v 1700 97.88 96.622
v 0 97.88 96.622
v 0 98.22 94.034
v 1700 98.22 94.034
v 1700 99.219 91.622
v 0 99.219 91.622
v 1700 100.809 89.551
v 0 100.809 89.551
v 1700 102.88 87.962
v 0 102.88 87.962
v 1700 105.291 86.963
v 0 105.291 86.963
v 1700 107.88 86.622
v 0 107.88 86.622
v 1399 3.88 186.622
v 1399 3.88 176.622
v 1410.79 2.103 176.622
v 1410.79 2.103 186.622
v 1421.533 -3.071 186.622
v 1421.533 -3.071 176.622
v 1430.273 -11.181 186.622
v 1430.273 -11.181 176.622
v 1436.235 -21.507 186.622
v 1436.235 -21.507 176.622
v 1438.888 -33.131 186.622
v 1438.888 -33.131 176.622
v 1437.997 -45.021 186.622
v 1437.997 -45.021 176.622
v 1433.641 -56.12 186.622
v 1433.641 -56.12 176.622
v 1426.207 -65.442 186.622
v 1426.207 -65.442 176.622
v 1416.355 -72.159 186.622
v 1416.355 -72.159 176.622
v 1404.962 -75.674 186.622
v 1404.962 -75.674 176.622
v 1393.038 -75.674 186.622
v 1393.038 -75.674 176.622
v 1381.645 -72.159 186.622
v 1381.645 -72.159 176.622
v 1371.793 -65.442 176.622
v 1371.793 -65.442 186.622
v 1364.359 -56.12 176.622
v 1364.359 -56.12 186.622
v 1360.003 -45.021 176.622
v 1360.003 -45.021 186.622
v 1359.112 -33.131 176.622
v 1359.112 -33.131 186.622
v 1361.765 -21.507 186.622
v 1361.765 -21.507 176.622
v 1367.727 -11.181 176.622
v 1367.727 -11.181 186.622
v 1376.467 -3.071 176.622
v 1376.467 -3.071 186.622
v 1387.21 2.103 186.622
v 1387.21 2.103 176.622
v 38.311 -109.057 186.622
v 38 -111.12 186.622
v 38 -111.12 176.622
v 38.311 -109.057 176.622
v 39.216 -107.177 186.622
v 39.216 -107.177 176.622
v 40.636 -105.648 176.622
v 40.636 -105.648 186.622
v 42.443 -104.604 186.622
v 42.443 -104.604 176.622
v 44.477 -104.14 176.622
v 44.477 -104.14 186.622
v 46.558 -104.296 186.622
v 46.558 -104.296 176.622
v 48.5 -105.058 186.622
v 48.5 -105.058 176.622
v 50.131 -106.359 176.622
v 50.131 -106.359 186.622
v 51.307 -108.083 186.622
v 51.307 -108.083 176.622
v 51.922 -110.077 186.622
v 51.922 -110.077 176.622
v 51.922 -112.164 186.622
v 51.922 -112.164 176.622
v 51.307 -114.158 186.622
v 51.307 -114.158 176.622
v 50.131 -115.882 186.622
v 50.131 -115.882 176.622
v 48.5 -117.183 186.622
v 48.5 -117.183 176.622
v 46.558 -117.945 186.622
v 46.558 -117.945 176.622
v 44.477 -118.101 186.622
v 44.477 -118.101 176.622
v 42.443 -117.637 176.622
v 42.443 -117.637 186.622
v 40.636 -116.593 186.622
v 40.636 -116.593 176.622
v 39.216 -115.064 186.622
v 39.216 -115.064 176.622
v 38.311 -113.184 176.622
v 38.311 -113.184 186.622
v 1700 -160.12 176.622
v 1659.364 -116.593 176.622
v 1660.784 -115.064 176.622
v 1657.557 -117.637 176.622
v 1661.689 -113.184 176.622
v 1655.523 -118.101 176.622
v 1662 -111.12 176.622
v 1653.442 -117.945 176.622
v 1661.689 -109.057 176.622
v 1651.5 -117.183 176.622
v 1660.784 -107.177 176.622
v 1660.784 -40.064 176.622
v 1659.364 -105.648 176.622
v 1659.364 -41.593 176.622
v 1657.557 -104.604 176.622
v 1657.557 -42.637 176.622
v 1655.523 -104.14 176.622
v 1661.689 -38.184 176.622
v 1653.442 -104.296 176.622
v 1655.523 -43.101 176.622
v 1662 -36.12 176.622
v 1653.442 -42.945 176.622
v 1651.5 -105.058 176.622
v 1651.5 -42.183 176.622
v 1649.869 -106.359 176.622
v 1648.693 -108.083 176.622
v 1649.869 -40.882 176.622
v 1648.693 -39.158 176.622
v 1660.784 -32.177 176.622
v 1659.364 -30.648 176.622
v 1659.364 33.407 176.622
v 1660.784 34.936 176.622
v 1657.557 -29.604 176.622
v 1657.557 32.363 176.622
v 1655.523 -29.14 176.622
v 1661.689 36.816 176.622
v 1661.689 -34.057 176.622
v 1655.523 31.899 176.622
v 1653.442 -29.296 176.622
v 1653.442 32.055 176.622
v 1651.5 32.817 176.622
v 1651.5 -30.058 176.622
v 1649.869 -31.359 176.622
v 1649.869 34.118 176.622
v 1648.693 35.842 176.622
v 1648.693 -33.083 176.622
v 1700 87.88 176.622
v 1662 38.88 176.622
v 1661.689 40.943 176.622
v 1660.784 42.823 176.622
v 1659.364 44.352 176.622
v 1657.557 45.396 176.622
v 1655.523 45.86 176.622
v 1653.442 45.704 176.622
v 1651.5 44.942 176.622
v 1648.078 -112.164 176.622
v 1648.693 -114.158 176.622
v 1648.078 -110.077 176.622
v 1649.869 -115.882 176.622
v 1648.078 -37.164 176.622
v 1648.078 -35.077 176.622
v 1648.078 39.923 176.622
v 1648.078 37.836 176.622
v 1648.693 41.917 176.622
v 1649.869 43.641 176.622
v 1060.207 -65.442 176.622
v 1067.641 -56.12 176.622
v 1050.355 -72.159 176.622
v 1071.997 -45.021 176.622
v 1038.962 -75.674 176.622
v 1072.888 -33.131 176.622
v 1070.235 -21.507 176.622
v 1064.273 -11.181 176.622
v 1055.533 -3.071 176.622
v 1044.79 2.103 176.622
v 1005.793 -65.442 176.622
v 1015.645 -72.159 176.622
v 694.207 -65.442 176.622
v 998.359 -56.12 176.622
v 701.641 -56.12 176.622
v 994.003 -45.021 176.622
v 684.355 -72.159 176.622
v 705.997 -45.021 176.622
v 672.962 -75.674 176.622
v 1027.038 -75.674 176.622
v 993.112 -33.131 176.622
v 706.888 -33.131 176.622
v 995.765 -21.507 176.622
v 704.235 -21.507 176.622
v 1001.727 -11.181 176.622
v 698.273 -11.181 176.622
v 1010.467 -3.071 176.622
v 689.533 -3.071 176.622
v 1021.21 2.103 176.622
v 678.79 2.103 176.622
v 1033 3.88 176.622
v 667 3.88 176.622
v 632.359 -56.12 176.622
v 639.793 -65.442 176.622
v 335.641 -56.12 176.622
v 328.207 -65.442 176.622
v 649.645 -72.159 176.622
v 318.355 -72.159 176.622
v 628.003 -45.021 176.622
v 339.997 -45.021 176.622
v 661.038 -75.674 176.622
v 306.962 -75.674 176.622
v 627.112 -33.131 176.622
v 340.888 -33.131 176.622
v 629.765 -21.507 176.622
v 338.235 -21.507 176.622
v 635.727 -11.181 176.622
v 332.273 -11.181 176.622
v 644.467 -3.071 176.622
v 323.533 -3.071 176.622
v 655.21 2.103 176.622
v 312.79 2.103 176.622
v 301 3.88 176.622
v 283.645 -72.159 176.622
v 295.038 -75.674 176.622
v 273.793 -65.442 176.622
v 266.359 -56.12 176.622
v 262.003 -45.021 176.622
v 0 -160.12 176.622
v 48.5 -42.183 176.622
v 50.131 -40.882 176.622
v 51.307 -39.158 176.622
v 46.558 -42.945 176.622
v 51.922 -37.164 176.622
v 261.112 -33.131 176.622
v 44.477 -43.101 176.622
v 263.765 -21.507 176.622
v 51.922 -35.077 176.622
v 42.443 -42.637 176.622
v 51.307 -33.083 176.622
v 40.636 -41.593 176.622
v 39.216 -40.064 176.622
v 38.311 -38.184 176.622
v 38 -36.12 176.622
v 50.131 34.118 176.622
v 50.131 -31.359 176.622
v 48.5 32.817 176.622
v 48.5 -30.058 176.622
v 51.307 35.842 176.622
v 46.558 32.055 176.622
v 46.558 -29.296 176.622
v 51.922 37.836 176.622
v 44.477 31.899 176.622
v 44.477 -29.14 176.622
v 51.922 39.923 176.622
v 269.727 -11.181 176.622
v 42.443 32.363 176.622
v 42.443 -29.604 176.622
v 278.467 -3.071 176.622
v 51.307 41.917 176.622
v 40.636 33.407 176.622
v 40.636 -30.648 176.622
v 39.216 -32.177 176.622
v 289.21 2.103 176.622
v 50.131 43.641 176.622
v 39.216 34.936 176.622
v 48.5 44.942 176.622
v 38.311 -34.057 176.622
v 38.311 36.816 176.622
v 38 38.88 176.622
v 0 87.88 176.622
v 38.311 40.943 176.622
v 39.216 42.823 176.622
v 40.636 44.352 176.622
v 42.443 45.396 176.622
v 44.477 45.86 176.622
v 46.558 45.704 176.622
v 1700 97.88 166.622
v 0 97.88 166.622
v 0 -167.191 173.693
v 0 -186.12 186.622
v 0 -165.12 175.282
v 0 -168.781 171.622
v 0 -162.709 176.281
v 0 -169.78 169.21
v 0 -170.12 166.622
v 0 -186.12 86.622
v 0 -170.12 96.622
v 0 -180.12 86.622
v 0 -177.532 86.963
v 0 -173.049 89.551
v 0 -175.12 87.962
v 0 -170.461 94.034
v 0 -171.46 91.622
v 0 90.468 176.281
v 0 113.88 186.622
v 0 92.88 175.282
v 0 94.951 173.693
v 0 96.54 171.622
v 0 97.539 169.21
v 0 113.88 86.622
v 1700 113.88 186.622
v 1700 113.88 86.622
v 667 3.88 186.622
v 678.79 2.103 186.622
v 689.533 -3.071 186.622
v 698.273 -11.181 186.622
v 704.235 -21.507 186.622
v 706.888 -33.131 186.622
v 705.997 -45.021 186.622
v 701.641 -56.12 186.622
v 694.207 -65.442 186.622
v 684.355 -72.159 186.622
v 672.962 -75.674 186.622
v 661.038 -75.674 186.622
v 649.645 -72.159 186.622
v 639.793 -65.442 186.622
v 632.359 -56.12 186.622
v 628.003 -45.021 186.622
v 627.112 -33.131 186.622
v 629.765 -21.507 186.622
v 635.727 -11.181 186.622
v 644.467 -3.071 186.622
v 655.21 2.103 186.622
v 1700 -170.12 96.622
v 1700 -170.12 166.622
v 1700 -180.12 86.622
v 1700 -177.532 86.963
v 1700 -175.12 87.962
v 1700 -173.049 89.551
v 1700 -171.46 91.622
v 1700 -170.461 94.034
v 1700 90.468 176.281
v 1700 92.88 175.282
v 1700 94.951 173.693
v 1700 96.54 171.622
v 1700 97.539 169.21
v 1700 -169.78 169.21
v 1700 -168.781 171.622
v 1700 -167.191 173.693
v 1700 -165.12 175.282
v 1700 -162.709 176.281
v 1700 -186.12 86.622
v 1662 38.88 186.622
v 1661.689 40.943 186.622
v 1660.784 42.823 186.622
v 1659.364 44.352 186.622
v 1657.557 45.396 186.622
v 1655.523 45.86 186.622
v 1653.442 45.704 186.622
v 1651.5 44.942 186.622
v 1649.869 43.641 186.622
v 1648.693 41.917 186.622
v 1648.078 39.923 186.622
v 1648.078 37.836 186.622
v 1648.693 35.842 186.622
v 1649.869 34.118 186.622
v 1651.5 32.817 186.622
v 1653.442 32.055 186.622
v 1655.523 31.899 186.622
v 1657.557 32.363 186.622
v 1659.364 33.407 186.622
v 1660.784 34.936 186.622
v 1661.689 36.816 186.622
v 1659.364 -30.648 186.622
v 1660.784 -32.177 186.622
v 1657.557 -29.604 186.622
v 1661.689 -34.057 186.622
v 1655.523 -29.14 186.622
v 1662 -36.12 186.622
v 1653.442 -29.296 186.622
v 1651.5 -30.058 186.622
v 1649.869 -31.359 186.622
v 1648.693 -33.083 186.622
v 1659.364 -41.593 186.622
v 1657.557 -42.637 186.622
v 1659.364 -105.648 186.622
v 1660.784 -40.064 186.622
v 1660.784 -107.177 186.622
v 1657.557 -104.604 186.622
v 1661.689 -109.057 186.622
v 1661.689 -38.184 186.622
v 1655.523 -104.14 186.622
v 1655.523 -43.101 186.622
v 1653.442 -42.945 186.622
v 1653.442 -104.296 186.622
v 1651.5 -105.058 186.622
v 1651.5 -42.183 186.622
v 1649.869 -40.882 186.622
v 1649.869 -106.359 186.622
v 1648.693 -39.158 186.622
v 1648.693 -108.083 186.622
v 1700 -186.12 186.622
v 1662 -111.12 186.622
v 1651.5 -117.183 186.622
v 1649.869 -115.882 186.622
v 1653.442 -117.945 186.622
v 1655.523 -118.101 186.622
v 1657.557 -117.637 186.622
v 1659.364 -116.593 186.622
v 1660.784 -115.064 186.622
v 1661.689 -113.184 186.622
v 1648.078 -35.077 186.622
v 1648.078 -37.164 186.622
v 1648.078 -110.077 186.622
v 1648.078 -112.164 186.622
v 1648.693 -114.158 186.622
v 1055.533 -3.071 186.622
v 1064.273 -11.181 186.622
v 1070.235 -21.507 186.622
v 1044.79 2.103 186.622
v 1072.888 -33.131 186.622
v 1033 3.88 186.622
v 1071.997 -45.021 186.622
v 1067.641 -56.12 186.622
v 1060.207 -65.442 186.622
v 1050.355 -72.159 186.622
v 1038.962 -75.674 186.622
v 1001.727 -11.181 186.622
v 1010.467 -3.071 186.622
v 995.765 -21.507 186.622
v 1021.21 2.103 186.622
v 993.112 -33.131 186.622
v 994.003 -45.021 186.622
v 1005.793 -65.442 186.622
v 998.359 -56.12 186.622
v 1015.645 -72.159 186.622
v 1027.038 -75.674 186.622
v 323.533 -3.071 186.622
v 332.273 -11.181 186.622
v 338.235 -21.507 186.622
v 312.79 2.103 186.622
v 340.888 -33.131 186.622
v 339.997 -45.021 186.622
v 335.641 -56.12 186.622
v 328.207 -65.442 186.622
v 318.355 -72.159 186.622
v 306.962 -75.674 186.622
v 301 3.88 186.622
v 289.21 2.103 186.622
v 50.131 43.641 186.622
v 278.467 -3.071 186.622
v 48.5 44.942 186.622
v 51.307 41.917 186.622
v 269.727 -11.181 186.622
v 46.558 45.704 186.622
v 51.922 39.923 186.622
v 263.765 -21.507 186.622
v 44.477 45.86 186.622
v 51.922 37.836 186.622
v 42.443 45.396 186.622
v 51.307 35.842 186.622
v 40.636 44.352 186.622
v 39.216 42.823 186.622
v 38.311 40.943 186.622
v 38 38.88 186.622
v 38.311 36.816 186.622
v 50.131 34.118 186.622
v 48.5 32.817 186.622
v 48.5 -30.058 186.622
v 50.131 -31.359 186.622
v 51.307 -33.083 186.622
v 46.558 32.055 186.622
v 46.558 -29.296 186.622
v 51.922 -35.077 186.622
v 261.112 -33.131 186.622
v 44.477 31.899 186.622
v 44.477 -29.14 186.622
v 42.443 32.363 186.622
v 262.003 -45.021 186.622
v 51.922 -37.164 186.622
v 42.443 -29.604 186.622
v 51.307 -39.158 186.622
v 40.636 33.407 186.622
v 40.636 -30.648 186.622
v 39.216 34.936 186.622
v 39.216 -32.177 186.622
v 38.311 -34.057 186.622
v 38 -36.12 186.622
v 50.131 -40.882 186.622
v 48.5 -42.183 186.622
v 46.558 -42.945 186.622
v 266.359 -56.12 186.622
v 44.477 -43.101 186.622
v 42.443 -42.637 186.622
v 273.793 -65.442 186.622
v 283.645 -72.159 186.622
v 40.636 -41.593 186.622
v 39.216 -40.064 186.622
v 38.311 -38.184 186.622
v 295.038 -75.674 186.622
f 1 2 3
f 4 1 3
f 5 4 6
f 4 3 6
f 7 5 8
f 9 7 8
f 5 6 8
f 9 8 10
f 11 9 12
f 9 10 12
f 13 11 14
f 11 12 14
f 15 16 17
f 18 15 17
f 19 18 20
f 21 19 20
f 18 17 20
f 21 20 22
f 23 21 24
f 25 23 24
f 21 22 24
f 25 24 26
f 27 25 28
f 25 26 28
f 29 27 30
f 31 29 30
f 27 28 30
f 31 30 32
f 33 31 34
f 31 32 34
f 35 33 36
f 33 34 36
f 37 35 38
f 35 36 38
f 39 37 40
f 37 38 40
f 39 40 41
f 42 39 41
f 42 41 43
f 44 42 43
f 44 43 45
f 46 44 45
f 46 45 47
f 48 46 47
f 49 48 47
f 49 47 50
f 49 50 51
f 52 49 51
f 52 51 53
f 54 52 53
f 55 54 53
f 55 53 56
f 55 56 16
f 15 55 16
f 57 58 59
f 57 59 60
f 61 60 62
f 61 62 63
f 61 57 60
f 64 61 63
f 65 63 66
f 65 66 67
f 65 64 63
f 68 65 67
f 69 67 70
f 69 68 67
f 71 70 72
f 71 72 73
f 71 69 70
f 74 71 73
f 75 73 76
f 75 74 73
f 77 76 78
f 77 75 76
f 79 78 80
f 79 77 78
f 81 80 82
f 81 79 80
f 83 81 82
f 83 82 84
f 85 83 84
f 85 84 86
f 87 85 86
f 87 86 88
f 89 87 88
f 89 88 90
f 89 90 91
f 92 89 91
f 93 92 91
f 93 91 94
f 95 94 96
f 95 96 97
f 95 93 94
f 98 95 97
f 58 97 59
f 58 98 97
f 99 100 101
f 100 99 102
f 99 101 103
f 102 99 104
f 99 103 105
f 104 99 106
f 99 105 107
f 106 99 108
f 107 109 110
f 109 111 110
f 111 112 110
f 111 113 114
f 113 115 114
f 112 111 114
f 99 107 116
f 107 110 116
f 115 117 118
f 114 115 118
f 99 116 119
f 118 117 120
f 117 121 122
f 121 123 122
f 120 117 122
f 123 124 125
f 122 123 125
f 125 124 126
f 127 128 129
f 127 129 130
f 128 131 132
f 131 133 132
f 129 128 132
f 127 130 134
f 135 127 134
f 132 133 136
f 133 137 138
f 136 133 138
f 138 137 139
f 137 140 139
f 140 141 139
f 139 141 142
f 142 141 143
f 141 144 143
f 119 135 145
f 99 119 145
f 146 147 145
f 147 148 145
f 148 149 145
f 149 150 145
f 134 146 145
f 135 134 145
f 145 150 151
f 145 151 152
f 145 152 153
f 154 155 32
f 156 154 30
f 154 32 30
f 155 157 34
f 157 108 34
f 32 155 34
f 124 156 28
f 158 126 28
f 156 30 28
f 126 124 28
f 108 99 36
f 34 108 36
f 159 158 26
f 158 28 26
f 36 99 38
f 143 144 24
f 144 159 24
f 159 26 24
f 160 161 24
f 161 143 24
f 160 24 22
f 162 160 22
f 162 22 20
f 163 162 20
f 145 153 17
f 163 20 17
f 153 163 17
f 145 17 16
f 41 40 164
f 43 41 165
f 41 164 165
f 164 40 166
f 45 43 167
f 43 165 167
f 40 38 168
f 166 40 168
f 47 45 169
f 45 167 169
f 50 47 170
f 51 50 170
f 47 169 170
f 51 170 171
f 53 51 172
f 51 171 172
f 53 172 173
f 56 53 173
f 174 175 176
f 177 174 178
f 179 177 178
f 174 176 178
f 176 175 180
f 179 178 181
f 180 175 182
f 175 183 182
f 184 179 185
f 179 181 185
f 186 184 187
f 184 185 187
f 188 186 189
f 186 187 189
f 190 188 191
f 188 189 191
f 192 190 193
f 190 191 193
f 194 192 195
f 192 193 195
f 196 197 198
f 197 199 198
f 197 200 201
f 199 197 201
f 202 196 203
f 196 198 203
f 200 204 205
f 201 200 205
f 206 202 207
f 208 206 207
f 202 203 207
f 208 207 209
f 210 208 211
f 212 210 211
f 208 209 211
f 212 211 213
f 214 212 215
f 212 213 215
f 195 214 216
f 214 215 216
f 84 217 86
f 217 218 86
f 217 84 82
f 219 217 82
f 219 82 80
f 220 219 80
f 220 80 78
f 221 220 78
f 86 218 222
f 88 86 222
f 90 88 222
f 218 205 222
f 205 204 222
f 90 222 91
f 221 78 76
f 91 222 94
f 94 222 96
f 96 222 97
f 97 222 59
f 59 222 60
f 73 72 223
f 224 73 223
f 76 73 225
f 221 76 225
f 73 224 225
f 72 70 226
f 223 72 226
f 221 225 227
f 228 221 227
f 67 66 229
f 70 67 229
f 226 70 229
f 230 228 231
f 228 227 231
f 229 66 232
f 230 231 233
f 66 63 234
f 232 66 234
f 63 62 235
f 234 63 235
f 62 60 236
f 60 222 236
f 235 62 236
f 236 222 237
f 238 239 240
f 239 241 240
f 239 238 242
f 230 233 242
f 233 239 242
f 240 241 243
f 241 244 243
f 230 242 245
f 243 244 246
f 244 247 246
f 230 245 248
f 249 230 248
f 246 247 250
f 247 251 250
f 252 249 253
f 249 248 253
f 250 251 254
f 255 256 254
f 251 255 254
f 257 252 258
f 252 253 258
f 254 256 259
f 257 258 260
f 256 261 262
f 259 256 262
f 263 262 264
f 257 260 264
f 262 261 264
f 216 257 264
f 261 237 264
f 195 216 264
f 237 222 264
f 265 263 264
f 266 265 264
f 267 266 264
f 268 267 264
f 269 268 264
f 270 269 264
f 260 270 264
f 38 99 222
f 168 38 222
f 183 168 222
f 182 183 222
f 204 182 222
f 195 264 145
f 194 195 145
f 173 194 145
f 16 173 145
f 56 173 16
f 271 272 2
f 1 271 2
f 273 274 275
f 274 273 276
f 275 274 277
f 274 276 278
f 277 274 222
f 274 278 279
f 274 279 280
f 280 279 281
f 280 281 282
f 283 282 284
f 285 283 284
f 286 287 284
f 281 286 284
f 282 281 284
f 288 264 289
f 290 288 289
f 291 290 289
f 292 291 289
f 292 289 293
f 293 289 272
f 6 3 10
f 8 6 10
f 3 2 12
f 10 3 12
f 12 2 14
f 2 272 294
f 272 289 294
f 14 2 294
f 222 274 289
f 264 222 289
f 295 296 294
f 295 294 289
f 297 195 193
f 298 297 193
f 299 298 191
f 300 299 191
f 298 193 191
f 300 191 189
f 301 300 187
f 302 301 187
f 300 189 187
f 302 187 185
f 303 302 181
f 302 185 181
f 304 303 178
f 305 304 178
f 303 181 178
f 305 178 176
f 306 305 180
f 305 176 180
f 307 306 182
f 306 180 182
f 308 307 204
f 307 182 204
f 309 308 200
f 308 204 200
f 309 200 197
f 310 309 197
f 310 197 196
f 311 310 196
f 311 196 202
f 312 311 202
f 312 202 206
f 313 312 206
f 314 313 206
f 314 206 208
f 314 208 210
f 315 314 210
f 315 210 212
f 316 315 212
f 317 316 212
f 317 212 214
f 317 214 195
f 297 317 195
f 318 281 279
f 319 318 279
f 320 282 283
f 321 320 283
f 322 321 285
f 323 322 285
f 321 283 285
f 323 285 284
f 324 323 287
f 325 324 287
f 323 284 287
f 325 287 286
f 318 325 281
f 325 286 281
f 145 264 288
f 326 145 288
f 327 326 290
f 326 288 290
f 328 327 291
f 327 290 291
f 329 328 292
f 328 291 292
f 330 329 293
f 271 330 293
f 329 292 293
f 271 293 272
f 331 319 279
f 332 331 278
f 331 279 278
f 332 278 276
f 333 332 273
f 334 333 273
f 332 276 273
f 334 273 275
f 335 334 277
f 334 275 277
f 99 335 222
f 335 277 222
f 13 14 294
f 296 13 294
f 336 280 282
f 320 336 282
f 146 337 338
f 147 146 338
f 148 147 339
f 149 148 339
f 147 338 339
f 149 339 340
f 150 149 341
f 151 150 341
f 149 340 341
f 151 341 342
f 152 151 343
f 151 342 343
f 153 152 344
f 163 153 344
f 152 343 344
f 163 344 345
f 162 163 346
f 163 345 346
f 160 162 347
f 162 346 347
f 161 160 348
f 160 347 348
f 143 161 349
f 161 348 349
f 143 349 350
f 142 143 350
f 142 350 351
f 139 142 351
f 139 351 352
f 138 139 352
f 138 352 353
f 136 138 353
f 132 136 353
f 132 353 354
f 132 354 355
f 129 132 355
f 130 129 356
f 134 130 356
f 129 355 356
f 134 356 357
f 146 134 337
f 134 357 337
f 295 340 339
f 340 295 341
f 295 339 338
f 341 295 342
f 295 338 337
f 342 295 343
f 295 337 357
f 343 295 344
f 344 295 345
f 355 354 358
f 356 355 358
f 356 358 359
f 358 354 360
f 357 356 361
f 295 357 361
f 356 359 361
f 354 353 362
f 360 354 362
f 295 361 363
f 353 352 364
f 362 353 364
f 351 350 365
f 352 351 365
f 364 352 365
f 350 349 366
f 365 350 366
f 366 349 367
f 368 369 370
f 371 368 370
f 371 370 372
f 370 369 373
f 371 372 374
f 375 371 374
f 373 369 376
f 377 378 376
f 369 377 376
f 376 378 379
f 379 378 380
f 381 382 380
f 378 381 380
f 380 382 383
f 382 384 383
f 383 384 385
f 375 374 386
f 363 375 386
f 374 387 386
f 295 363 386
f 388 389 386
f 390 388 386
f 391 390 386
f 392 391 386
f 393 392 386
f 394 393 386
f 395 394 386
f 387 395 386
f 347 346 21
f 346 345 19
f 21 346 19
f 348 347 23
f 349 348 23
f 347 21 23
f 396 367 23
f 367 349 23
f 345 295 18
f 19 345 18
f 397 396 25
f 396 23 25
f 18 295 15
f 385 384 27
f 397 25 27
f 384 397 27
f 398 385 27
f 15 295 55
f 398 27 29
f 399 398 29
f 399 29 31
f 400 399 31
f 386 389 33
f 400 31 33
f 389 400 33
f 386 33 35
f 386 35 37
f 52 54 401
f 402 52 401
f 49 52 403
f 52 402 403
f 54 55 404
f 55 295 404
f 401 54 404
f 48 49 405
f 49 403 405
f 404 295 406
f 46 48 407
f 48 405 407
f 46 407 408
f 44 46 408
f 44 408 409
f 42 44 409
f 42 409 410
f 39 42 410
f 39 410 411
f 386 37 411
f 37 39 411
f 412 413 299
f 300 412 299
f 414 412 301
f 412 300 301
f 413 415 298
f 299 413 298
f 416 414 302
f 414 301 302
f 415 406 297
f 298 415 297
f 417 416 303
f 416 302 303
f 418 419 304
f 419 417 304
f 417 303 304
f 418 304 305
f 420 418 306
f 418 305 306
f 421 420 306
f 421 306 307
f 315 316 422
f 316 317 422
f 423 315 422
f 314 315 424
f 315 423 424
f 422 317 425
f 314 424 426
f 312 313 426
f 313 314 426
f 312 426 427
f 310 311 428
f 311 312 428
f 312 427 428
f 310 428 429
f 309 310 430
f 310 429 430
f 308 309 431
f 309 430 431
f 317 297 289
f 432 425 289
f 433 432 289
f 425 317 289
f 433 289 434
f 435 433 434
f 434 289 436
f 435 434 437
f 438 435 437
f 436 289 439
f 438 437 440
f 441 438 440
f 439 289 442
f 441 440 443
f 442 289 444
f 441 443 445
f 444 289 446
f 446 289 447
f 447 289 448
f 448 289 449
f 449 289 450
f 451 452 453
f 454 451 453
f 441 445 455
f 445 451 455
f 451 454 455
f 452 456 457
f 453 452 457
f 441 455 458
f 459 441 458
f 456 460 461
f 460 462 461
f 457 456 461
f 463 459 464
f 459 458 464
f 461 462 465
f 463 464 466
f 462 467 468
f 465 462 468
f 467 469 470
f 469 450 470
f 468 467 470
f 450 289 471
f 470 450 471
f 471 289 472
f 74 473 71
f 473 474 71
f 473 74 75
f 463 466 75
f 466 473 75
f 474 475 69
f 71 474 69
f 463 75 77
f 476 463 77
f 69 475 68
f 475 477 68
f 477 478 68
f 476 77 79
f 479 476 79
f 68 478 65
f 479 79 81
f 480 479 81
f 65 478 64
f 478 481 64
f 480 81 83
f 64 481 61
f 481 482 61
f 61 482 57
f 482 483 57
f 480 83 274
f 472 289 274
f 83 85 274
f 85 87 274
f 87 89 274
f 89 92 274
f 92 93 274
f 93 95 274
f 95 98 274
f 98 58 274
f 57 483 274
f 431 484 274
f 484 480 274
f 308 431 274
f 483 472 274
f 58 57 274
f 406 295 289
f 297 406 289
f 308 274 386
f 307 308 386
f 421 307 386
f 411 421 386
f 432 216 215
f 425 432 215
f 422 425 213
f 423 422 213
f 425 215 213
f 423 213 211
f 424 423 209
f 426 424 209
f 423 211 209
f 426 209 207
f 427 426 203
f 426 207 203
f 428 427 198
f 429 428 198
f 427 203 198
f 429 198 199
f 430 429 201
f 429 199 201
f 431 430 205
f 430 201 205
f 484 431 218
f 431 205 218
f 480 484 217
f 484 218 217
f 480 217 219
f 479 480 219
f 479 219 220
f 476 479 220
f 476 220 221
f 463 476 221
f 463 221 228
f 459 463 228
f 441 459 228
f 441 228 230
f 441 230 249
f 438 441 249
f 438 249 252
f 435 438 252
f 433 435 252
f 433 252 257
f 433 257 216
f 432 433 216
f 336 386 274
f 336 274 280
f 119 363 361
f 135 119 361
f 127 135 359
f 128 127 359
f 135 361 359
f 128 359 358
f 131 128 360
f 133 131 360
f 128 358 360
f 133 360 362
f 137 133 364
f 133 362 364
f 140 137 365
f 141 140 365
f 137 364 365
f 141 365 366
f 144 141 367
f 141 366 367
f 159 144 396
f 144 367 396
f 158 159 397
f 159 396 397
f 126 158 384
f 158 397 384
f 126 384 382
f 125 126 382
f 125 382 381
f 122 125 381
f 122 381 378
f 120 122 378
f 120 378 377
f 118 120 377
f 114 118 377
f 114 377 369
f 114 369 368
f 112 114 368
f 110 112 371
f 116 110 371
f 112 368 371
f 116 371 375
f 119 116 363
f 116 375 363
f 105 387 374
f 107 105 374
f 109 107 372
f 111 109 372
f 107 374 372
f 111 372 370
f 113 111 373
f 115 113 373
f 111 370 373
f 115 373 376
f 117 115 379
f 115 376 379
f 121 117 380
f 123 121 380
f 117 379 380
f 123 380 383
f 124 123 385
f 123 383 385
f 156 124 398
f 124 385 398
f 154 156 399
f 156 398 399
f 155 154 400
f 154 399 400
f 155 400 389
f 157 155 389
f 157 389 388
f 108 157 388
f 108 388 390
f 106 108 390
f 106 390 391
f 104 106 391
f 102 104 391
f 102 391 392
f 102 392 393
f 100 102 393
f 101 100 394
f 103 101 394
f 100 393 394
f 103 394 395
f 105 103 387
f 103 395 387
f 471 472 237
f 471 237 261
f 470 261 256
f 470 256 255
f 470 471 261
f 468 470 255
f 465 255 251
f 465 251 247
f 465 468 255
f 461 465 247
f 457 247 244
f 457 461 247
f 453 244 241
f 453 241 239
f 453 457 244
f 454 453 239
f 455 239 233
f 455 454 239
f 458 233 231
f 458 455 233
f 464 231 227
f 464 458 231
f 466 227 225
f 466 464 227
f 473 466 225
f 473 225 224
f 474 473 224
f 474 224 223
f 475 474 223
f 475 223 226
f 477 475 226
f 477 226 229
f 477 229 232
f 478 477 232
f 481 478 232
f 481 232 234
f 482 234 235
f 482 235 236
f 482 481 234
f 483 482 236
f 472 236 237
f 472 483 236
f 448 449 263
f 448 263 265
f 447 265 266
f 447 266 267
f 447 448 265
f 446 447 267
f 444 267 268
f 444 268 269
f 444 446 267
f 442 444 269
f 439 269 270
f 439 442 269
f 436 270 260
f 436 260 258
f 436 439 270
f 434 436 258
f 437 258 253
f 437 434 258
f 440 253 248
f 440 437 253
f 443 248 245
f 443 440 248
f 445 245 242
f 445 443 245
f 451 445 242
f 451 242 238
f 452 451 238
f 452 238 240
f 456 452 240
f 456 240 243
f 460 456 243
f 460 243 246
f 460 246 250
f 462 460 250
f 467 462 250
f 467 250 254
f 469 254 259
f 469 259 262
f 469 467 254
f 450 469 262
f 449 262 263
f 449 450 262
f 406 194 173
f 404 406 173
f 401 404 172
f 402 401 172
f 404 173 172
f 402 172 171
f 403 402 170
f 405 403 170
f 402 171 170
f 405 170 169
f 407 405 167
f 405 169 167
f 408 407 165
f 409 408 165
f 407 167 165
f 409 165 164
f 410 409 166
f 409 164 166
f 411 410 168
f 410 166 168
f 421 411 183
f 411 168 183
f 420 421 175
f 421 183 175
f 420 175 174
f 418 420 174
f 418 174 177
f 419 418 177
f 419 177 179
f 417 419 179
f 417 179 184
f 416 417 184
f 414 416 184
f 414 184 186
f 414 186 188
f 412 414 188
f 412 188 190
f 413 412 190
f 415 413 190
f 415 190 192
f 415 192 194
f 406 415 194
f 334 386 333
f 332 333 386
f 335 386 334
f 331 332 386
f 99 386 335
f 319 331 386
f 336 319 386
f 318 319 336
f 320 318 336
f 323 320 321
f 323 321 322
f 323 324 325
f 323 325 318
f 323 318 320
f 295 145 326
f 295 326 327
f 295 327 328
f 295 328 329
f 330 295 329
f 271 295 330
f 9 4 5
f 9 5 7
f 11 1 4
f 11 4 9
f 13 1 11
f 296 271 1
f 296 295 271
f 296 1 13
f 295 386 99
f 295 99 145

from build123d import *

# Parameters (mm, degrees)
BOSS_EXTRUDE1_DEPTH = 1700
SKETCH3_R           = 7
CUT_EXTRUDE1_DEPTH  = 10
SKETCH5_R           = 40
CUT_EXTRUDE3_DEPTH  = 30
LPATTERN2_COUNT     = 4
LPATTERN2_PITCH     = 366


with BuildPart() as part:
    # Sketch1 → Boss-Extrude1 (new body)
    with BuildSketch(Plane(origin=(0, 0, 0), x_dir=(0, 0, -1), z_dir=(1, 0, 0))):
        with BuildLine():
            Line((-86.622073579, 113.879598662), (-186.622073579, 113.879598662))
            Line((-186.622073579, 113.879598662), (-186.622073579, -186.120401338))
            Line((-186.622073579, -186.120401338), (-86.622073579, -186.120401338))
            Line((-86.622073579, -186.120401338), (-86.622073579, -180.120401338))
            ThreePointArc((-86.622073579, -180.120401338), (-89.551005767, -173.049333526), (-96.622073579, -170.120401338))
            Line((-96.622073579, -170.120401338), (-166.622073579, -170.120401338))
            ThreePointArc((-166.622073579, -170.120401338), (-173.69314139, -167.19146915), (-176.622073579, -160.120401338))
            Line((-176.622073579, -160.120401338), (-176.622073579, 87.879598662))
            ThreePointArc((-176.622073579, 87.879598662), (-173.69314139, 94.950666474), (-166.622073579, 97.879598662))
            Line((-166.622073579, 97.879598662), (-96.622073579, 97.879598662))
            ThreePointArc((-96.622073579, 97.879598662), (-89.551005767, 100.80853085), (-86.622073579, 107.879598662))
            Line((-86.622073579, 107.879598662), (-86.622073579, 113.879598662))
        make_face()
    extrude(amount=BOSS_EXTRUDE1_DEPTH)

    # Sketch3 → Cut-Extrude1 (cut)
    with BuildSketch(Plane.XY.offset(186.622073579)):
        with Locations((1655, 38.879598662)):
            Circle(SKETCH3_R)
        with Locations((1655, -36.120401338)):
            Circle(SKETCH3_R)
        with Locations((1655, -111.120401338)):
            Circle(SKETCH3_R)
    cut_extrude1 = extrude(amount=-CUT_EXTRUDE1_DEPTH, mode=Mode.SUBTRACT)

    # Mirror1: Cut-Extrude1 across plane
    add(cut_extrude1.mirror(Plane(origin=(850, 0, 0), x_dir=(0, 0, 1), z_dir=(1, 0, 0))), mode=Mode.SUBTRACT)

    # Sketch5 → Cut-Extrude3 (cut)
    with BuildSketch(Plane(origin=(0, 0, 176.622073579), x_dir=(-1, 0, 0), z_dir=(0, 0, -1))):
        with Locations(Location((-1399, -36.120401338, 0), (0, 0, 90))):
            Circle(SKETCH5_R)
    cut_extrude3 = extrude(amount=-CUT_EXTRUDE3_DEPTH, mode=Mode.SUBTRACT)

    # LPattern2: Cut-Extrude3 ×4
    with Locations(*[(-i * LPATTERN2_PITCH, 0, 0) for i in range(1, LPATTERN2_COUNT)]):
        add(cut_extrude3, mode=Mode.SUBTRACT)


solid = part.part
